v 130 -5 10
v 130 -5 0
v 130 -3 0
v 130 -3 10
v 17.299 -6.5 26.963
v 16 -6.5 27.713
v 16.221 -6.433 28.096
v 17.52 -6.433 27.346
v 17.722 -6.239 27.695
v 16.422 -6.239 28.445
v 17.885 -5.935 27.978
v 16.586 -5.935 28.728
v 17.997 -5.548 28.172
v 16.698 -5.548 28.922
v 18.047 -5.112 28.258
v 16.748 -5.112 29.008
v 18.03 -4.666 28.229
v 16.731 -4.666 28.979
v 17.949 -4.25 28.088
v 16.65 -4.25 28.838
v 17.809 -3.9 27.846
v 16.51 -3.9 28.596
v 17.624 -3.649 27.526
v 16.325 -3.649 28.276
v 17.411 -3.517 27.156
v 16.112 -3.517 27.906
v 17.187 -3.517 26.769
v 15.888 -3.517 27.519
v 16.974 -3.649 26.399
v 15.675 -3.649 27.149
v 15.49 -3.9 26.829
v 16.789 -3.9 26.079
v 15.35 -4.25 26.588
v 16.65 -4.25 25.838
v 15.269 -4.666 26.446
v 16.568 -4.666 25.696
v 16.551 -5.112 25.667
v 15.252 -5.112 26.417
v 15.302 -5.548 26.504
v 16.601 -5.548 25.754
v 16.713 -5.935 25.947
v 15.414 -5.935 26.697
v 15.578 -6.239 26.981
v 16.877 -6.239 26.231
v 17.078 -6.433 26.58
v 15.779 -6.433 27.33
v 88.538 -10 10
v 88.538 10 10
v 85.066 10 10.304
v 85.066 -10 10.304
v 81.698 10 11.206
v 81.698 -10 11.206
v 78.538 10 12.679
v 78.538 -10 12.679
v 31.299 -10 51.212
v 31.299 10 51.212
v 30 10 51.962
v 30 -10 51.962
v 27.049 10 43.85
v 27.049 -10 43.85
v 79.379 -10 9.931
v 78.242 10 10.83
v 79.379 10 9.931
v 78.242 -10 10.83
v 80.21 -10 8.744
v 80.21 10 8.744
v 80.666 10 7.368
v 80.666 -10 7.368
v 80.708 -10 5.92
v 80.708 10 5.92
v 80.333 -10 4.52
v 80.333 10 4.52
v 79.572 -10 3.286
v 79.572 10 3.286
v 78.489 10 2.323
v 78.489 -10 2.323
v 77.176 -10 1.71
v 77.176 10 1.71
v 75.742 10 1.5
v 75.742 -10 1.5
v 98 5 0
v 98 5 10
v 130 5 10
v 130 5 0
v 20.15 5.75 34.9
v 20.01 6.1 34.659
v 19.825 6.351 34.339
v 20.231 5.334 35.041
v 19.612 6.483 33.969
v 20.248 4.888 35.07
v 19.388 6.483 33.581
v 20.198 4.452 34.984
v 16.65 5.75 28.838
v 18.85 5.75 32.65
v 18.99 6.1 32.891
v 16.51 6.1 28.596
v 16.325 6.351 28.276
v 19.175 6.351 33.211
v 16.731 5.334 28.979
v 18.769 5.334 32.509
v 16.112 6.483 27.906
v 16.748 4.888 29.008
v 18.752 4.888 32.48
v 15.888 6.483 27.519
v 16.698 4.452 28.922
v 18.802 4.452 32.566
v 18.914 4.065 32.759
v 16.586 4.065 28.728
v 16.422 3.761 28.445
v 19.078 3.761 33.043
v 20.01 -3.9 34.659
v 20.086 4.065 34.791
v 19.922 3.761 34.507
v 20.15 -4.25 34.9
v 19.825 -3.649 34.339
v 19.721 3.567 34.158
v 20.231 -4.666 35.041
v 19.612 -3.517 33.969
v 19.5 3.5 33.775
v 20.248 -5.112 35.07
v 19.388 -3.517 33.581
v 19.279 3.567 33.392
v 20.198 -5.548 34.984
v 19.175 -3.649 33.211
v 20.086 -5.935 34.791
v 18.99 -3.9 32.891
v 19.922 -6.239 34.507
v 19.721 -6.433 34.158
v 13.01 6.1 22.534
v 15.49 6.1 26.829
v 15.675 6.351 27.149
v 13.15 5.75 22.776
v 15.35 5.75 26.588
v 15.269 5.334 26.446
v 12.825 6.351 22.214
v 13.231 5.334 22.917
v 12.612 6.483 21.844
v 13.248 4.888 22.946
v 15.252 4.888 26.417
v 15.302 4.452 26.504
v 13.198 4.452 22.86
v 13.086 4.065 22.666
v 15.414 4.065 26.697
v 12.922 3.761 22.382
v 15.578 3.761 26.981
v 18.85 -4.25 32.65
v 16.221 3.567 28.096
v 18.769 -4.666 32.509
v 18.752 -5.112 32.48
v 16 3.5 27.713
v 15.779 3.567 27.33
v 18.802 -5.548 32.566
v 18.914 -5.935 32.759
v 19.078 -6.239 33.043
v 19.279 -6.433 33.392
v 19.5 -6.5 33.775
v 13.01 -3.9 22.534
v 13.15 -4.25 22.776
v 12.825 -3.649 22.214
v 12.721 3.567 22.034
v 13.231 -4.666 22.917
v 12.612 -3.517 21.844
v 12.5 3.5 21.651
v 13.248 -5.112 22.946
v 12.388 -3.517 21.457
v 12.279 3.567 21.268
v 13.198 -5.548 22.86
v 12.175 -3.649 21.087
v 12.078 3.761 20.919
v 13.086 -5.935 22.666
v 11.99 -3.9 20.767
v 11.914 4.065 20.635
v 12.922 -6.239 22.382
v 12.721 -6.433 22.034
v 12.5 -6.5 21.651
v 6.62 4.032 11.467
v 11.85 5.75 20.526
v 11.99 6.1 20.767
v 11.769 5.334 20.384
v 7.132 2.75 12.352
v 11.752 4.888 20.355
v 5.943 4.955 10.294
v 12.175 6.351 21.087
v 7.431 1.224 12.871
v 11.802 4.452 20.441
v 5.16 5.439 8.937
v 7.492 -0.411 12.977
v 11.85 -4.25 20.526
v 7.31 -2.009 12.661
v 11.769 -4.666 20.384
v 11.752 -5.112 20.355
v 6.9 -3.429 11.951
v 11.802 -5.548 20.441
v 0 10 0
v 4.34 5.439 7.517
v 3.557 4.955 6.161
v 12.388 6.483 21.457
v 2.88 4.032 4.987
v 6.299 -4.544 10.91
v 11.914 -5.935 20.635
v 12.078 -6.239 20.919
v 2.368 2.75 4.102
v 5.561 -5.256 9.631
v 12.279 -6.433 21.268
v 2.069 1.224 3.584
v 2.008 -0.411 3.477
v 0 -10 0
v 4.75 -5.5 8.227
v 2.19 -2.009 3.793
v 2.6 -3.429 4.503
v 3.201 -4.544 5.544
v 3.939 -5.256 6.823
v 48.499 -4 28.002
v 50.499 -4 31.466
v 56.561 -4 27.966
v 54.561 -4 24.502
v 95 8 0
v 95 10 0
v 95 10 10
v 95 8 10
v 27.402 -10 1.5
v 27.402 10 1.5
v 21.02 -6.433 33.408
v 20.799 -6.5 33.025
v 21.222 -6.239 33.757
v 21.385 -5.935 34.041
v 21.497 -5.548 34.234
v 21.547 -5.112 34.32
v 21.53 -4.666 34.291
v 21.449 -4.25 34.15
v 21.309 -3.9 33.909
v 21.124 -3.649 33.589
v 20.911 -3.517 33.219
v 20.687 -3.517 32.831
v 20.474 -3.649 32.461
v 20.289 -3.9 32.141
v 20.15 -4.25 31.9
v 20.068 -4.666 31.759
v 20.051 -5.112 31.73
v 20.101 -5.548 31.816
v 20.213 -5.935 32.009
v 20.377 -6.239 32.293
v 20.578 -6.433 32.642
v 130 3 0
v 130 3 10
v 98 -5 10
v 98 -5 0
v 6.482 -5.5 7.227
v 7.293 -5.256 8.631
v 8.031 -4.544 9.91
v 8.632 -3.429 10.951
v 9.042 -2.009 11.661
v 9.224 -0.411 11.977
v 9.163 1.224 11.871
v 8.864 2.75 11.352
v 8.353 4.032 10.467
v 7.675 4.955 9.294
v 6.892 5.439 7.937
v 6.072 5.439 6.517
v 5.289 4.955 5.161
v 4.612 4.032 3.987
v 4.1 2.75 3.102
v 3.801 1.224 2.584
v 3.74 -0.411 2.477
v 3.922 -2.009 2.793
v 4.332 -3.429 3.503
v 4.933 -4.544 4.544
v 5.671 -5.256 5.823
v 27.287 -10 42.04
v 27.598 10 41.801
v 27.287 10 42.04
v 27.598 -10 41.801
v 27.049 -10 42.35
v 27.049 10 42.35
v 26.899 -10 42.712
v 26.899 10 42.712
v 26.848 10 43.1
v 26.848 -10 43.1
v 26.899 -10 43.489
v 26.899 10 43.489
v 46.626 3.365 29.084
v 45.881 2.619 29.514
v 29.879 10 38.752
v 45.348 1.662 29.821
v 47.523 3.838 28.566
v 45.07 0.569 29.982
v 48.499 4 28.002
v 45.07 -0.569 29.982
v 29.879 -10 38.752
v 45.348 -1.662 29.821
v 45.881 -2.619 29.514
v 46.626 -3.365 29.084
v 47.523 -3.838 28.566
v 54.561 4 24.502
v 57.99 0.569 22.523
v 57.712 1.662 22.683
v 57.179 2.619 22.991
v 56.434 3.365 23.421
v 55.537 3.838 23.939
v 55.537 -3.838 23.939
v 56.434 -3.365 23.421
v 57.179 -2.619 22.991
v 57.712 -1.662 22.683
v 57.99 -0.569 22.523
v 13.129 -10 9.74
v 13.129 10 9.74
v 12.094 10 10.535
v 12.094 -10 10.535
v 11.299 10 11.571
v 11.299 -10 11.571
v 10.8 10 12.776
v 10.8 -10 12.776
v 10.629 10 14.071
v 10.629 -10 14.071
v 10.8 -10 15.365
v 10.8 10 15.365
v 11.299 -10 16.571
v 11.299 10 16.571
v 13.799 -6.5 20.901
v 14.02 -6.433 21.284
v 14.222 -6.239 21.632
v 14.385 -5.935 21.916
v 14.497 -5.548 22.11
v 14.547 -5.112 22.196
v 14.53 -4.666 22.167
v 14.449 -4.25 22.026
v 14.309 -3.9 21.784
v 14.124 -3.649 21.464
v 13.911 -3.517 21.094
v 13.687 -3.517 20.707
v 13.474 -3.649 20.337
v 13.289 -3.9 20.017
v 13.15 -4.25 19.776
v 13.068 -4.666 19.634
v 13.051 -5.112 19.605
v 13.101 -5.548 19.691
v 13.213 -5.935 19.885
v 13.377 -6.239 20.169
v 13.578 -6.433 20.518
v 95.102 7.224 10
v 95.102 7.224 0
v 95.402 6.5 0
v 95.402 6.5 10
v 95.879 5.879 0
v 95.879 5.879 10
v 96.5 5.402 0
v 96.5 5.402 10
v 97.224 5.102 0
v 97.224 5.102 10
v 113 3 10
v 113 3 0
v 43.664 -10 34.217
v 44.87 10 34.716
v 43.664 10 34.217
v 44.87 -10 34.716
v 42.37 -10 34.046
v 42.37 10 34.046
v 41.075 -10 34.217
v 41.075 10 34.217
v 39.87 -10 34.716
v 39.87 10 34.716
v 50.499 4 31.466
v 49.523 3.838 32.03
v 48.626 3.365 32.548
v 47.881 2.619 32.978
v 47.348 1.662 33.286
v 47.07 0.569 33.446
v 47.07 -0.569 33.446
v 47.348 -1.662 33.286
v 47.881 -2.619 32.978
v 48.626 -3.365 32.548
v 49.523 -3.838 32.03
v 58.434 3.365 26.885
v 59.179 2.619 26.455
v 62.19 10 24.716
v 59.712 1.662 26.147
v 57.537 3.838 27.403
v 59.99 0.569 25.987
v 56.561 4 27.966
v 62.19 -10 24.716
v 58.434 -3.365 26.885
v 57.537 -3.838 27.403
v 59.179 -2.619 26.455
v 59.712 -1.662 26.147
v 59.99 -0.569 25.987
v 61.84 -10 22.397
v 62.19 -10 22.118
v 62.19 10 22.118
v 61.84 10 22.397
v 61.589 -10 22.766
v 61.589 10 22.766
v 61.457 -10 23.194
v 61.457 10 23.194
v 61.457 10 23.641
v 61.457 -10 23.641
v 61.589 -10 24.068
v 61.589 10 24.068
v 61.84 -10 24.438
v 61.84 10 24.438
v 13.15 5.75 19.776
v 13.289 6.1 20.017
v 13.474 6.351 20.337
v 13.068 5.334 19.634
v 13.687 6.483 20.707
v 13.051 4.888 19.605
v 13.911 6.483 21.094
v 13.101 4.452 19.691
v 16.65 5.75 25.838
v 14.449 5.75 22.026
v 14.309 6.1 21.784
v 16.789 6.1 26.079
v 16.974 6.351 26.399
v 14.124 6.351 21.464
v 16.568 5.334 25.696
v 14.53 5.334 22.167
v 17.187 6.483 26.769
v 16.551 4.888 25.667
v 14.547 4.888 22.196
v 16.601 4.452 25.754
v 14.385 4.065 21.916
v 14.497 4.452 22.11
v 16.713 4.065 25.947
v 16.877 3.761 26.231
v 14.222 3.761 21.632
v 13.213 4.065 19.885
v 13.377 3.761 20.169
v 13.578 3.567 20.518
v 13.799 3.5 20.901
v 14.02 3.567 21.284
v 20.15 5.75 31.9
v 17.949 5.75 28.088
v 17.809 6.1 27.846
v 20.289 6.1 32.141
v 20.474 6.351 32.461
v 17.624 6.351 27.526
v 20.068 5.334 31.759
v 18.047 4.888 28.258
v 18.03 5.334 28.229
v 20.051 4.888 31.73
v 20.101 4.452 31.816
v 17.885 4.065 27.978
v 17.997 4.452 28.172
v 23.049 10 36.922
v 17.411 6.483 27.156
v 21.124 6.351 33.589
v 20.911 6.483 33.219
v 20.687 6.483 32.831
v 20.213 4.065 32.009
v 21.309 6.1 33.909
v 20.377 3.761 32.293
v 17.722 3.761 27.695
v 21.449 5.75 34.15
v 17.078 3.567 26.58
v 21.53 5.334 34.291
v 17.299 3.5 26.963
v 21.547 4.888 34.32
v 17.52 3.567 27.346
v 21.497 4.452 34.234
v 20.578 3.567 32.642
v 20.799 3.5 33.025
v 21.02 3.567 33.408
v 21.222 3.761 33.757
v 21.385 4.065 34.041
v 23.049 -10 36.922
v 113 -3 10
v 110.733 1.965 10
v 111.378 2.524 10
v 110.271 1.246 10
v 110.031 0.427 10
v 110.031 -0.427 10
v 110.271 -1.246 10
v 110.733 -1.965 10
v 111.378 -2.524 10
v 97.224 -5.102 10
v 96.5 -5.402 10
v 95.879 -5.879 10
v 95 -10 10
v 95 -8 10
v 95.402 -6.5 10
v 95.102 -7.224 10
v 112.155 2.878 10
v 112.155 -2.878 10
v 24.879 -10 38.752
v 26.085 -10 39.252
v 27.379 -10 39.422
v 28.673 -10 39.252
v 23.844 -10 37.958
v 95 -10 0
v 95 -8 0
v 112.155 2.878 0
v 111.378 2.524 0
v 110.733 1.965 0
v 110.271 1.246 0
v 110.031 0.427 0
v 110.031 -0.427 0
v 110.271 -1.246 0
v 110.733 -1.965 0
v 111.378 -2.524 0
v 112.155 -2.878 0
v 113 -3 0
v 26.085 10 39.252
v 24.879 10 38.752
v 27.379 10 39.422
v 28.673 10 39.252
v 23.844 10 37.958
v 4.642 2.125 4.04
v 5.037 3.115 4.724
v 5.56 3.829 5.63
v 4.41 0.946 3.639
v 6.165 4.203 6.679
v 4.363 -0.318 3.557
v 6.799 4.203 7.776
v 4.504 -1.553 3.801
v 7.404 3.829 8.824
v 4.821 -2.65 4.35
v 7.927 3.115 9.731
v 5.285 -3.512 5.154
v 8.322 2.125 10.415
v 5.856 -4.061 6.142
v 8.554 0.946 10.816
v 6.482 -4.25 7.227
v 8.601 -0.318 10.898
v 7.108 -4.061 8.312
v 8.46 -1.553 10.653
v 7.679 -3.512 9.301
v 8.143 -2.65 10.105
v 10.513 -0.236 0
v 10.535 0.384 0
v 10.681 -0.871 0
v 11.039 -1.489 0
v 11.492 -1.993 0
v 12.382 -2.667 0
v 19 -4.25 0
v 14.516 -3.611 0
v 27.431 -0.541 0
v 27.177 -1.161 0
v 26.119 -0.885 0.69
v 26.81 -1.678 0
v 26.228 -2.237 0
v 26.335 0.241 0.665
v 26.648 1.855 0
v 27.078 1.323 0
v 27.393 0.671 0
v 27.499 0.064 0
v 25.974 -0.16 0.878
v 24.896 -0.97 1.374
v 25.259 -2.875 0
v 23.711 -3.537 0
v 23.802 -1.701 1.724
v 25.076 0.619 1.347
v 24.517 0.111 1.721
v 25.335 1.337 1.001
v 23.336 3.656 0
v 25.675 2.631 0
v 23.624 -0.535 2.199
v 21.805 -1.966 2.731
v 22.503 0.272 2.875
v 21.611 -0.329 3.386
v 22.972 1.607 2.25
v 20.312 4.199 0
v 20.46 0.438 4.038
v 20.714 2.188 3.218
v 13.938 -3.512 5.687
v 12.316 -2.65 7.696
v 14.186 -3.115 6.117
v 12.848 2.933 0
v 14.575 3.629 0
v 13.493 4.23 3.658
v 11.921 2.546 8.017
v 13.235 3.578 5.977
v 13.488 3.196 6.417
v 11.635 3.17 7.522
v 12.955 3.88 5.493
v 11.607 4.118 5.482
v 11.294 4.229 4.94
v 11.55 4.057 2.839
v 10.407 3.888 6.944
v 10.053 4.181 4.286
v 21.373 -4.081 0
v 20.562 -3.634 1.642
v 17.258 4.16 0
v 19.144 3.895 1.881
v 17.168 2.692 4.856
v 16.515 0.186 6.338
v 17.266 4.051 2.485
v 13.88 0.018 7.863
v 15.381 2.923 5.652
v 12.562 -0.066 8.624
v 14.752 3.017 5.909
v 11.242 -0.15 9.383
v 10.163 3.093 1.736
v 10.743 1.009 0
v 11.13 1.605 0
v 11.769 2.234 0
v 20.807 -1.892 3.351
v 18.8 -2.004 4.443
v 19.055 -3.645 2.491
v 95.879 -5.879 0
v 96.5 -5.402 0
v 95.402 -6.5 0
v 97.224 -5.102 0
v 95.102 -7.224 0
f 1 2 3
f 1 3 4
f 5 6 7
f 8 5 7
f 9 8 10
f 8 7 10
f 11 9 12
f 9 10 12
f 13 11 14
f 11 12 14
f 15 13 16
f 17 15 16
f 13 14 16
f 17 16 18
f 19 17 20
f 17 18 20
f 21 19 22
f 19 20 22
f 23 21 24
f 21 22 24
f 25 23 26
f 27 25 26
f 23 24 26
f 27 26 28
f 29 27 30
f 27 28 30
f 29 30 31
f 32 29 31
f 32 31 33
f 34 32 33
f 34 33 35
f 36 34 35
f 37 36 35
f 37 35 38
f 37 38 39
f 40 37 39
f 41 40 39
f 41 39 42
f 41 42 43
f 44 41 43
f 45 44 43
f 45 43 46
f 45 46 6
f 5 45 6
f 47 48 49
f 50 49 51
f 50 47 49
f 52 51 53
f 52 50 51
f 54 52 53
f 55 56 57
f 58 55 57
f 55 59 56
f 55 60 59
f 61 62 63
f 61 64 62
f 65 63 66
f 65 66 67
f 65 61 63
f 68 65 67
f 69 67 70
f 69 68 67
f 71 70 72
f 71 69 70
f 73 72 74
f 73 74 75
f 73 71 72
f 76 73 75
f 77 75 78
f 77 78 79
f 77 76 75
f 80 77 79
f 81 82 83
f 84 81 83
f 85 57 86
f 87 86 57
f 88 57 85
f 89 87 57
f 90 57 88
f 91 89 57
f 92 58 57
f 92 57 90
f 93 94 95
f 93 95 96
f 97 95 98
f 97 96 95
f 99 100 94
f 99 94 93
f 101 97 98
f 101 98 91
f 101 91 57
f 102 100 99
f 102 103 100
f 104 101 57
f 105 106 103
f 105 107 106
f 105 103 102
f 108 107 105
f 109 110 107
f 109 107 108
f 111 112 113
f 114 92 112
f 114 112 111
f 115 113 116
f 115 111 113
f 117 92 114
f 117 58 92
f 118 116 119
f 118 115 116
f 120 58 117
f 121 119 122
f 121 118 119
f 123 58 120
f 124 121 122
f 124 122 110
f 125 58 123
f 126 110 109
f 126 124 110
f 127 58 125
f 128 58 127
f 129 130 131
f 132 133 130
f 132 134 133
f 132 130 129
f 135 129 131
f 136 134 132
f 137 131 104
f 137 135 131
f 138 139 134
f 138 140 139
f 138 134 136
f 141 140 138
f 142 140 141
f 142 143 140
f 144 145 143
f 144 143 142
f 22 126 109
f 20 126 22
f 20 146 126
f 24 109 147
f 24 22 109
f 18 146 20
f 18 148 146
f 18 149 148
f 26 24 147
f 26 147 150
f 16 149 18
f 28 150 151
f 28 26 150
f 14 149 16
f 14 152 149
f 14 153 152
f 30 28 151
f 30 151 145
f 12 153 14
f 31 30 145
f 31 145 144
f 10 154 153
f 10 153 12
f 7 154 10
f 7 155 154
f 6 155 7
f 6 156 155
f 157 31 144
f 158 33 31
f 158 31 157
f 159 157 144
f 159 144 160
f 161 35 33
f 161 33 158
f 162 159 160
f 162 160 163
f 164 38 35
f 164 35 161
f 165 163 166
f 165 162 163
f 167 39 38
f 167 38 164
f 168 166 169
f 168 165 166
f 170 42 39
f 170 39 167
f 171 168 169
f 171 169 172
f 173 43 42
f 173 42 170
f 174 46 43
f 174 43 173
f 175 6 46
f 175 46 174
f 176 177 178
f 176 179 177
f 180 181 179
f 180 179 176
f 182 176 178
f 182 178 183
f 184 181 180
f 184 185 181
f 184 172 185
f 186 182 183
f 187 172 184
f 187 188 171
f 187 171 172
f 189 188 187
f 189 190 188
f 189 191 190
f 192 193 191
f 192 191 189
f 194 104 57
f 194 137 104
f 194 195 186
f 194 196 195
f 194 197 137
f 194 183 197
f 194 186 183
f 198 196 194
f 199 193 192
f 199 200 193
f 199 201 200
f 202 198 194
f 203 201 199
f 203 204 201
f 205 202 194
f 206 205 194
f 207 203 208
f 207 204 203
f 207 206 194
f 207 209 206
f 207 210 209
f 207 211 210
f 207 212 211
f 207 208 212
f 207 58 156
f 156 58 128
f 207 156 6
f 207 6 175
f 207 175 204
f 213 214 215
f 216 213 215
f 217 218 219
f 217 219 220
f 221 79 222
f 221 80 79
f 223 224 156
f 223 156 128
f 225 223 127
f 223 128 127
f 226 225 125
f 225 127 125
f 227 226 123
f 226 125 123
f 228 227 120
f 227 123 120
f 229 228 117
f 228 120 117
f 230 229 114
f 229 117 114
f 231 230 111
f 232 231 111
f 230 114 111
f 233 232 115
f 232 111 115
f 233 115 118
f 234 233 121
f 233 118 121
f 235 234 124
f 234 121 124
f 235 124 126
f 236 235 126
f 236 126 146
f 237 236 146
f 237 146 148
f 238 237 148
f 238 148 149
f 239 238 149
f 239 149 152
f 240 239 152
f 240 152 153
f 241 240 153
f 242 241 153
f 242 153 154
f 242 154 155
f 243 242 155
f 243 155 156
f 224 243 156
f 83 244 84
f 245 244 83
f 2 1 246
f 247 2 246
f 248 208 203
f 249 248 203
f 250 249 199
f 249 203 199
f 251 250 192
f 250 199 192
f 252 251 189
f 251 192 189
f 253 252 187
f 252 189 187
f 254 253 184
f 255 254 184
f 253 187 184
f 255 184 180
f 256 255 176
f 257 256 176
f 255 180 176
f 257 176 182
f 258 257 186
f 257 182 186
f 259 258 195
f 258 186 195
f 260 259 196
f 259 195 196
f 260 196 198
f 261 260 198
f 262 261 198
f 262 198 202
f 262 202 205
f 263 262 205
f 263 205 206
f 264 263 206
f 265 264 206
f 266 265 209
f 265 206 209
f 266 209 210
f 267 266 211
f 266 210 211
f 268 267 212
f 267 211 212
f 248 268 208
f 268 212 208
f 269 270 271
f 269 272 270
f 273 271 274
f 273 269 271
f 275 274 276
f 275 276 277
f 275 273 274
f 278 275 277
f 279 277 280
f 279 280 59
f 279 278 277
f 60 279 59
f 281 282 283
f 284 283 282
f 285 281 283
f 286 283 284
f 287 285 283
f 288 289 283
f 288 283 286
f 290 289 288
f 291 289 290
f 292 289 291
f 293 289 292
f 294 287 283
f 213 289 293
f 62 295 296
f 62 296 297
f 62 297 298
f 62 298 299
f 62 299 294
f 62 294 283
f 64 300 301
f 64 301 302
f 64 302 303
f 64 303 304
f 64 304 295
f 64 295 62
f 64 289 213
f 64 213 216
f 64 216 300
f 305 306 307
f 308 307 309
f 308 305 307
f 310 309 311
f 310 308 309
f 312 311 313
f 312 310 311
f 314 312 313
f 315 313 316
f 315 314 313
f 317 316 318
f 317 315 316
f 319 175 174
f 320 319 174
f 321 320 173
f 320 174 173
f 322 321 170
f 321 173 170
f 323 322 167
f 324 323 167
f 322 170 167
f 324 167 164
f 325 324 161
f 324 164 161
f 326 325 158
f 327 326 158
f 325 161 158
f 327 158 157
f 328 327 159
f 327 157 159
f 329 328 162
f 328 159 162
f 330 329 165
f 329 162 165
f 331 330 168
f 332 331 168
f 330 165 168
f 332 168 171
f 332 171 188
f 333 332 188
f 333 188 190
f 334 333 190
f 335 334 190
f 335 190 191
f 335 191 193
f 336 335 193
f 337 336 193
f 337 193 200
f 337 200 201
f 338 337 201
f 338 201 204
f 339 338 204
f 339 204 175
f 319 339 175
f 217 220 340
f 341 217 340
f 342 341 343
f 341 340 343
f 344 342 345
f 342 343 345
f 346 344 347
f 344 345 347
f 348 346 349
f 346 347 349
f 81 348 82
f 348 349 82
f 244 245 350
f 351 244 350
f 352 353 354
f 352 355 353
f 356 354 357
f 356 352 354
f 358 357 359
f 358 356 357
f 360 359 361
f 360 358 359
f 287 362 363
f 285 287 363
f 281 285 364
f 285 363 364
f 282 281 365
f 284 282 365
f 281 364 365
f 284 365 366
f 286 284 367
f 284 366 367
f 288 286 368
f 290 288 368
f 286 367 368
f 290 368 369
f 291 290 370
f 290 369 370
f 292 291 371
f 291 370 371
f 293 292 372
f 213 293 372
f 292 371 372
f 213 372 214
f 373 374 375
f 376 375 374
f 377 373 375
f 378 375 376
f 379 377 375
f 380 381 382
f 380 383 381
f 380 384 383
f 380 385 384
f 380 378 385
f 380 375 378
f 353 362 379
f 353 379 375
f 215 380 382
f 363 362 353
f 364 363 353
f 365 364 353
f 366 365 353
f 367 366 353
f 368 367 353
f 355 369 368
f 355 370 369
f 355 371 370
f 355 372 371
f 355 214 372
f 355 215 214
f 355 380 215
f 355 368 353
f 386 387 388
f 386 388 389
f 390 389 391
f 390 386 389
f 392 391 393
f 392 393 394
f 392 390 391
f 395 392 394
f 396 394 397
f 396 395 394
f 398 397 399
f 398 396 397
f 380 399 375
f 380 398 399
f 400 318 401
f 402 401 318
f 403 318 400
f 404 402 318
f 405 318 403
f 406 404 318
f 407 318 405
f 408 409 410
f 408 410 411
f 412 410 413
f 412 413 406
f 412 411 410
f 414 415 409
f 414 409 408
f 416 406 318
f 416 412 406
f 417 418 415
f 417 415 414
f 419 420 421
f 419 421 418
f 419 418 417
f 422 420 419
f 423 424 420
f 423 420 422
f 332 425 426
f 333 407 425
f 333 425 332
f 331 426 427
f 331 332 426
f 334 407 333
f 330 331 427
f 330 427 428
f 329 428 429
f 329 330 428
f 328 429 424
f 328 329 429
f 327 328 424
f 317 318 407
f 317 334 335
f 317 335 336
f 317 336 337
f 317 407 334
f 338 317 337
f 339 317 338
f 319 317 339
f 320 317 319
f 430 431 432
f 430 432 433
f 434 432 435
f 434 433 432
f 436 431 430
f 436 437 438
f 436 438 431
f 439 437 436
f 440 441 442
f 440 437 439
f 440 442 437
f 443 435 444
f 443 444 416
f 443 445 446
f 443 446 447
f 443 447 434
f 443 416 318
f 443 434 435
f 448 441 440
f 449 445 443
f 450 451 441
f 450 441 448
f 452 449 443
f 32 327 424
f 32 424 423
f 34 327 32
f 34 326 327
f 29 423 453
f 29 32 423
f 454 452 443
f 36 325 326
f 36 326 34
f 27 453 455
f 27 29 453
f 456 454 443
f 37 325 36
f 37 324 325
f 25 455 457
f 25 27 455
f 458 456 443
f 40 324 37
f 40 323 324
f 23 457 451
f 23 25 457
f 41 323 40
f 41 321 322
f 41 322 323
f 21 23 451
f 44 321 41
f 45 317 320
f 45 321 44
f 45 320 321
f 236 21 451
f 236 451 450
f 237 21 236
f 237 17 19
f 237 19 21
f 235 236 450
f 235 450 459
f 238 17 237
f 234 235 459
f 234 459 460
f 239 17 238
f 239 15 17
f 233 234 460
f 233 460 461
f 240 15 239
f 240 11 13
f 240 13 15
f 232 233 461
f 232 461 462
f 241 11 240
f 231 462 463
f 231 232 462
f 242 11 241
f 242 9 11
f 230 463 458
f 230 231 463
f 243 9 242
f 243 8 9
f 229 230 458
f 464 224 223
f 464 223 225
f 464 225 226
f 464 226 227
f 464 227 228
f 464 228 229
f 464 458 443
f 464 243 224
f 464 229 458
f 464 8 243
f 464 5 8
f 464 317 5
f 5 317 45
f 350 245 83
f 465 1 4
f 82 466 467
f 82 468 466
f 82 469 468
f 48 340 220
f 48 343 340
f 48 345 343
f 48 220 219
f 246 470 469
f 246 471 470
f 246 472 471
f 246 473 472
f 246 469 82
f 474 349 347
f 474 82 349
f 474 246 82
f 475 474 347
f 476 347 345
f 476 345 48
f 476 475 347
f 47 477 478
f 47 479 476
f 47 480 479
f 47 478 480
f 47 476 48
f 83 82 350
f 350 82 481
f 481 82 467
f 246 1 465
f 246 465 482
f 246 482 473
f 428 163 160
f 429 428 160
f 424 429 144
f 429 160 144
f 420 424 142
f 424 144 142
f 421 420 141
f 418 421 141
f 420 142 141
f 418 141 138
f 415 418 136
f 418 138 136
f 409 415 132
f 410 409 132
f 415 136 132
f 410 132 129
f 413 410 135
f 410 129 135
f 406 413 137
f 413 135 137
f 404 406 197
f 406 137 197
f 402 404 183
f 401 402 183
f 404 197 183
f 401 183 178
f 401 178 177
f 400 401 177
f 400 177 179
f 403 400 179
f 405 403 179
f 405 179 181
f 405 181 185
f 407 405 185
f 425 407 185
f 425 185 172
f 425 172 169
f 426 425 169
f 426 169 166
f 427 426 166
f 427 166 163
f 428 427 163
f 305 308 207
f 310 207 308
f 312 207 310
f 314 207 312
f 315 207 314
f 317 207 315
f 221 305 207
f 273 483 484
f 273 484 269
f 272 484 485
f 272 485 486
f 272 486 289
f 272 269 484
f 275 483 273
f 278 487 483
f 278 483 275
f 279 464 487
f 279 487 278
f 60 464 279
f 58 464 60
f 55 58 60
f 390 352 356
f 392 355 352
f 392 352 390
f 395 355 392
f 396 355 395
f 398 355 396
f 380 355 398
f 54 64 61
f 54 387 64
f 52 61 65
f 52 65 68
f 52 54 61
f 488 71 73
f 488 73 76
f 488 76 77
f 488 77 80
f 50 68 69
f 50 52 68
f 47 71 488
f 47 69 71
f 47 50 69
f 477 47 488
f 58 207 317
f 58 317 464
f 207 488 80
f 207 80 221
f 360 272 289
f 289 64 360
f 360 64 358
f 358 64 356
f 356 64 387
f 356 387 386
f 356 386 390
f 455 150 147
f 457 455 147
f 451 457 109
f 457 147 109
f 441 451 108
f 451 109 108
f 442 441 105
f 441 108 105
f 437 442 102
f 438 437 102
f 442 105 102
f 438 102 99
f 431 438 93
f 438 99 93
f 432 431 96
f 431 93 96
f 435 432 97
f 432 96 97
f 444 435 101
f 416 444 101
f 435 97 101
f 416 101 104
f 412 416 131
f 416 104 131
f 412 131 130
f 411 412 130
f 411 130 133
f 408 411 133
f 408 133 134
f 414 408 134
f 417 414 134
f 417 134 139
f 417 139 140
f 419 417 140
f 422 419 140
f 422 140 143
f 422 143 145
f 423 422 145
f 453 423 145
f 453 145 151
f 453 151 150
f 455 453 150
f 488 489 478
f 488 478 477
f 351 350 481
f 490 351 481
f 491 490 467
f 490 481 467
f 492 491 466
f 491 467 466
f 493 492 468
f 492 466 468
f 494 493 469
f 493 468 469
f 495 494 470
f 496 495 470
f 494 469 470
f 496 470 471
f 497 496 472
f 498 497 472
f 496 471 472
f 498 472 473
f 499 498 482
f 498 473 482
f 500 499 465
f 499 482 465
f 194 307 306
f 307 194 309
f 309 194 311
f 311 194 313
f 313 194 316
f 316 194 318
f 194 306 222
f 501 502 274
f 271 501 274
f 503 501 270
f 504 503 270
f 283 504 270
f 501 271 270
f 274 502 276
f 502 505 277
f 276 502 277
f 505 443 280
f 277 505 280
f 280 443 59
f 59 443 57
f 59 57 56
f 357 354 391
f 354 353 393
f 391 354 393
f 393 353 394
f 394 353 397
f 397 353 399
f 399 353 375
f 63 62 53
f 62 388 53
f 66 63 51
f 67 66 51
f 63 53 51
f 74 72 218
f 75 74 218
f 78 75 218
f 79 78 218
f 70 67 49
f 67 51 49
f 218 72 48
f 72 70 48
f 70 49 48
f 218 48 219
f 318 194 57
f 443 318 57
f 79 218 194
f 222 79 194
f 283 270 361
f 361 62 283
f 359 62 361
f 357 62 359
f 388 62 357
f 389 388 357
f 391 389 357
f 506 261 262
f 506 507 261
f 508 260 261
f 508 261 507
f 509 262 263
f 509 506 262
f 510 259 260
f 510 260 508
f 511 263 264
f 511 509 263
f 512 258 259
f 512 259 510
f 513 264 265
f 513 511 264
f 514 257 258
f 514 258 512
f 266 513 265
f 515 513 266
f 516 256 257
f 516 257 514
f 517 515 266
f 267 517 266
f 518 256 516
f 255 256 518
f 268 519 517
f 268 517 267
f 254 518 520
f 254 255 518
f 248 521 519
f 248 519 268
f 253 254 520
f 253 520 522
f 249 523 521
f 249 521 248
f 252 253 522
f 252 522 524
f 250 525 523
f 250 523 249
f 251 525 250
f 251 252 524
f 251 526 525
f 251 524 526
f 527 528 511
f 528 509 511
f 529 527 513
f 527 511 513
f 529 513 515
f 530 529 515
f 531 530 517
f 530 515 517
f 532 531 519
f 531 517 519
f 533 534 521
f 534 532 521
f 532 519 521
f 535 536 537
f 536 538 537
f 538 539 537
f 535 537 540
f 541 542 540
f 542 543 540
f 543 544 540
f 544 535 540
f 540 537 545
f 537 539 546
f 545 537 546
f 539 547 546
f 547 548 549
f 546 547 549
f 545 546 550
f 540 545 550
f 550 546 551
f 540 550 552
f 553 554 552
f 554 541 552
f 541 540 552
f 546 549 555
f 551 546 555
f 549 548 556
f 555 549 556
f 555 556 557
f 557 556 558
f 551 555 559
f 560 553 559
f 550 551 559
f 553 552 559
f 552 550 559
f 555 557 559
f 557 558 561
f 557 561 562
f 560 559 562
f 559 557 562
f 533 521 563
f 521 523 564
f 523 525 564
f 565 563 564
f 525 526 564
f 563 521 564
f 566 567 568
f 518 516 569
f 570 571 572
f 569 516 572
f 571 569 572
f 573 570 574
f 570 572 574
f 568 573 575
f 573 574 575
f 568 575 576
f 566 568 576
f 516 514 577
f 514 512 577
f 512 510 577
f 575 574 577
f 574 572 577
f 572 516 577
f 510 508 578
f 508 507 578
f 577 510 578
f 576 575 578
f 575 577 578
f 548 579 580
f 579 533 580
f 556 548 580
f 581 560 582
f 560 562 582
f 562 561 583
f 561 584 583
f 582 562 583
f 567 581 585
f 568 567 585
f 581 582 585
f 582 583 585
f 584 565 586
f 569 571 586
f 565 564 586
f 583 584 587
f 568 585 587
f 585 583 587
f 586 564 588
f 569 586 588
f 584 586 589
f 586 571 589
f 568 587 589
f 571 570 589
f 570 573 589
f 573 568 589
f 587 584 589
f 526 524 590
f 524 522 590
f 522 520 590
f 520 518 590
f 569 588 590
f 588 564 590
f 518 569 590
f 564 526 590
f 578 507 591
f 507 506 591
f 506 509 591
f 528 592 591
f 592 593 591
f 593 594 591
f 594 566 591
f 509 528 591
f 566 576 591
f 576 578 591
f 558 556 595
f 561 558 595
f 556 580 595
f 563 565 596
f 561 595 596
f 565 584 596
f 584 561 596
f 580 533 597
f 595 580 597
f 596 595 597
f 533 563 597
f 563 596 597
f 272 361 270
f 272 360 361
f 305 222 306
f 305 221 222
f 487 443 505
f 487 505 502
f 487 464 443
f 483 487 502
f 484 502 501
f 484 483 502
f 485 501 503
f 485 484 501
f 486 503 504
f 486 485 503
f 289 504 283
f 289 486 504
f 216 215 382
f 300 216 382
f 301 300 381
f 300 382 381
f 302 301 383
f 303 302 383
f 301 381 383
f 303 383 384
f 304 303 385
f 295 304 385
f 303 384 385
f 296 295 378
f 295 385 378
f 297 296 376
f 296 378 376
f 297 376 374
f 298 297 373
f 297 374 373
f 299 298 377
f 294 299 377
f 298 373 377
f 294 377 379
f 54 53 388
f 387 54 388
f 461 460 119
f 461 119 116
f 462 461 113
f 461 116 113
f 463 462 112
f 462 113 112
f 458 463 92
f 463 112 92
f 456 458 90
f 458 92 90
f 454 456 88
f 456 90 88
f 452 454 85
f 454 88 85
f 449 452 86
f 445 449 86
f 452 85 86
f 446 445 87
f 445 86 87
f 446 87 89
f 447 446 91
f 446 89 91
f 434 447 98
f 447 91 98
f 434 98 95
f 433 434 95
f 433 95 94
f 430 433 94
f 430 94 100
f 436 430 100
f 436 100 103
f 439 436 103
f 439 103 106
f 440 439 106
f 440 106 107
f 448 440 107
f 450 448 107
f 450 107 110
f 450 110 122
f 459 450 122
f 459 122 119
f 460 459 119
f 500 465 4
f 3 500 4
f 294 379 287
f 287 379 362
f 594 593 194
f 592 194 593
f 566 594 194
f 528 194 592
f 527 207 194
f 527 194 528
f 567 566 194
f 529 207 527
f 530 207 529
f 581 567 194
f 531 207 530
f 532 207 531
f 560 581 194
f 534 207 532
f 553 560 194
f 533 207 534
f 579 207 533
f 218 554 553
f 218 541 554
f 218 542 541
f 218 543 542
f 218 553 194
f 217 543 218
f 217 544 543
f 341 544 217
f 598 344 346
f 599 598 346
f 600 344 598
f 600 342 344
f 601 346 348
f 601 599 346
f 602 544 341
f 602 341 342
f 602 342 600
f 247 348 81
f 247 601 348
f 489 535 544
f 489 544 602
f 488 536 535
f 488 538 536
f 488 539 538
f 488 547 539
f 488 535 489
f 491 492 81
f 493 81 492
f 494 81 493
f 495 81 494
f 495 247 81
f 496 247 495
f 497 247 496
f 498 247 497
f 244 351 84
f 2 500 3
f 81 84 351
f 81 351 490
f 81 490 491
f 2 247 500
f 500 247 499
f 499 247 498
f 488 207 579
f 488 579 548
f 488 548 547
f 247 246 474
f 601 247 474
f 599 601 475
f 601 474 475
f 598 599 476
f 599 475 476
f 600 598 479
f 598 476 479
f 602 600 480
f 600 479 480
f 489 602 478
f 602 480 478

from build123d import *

# Parameters (mm, degrees)
F1_DEPTH  = 10
F4_DEPTH  = 8
F5_R      = 1.5
F6_DEPTH  = 30.83145
F7_R      = 5.5
F7_R_2    = 4.25
F8_DEPTH  = 2
F9_DEPTH  = 112.584302492
F11_DEPTH = 25


with BuildPart() as f1:
    # F0 (on Front) → F1 (new body, symmetric)
    with BuildSketch(Plane.XZ):
        with BuildLine():
            Line((30, 51.9615242271), (0, 0))
            Line((0, 0), (130, 0))
            Line((130, 0), (130, 10))
            Line((130, 10), (88.5384757729, 10))
            ThreePointArc((88.5384757729, 10), (83.3620948709, 10.6814834742), (78.5384757729, 12.6794919243))
            Line((78.5384757729, 12.6794919243), (62.1900542571, 22.1182574873))
            ThreePointArc((62.1900542571, 22.1182574873), (61.4400542571, 23.417295593), (62.1900542571, 24.7163336987))
            Line((62.1900542571, 24.7163336987), (44.8695461814, 34.7163336987))
            ThreePointArc((44.8695461814, 34.7163336987), (42.3695461814, 34.0464607176), (39.8695461814, 34.7163336987))
            Line((39.8695461814, 34.7163336987), (27.5980762114, 41.8012701892))
            ThreePointArc((27.5980762114, 41.8012701892), (26.8991874719, 42.7120797272), (27.0490381057, 43.8503082949))
            Line((27.0490381057, 43.8503082949), (31.2990381057, 51.2115242271))
            Line((31.2990381057, 51.2115242271), (30, 51.9615242271))
        make_face()
        with BuildLine():
            ThreePointArc((13.1291651246, 9.7403810568), (10.7995359932, 12.7764128502), (11.2990381057, 16.5705080757))
            Line((11.2990381057, 16.5705080757), (23.0490381057, 36.9221050646))
            ThreePointArc((23.0490381057, 36.9221050646), (26.0850698991, 39.2517341961), (29.8791651246, 38.7522320835))
            Line((29.8791651246, 38.7522320835), (78.2416697508, 10.8301270189))
            ThreePointArc((78.2416697508, 10.8301270189), (80.5712988822, 5.2059047745), (75.7416697508, 1.5))
            Line((75.7416697508, 1.5), (27.4019237886, 1.5))
            Line((27.4019237886, 1.5), (13.1291651246, 9.7403810568))
        make_face(mode=Mode.SUBTRACT)
    extrude(amount=F1_DEPTH, both=True)

    # F2 (on face) → F4 (cut)
    with BuildSketch(Plane(origin=(26.25, 0, 45.4663336987), x_dir=(0.8660254038, 0, -0.5), z_dir=(0.5, 0, 0.8660254038))):
        with BuildLine():
            ThreePointArc((28, 4), (24, 0), (28, -4))
            Line((28, -4), (35, -4))
            ThreePointArc((35, -4), (39, 0), (35, 4))
            Line((35, 4), (28, 4))
        make_face()
    extrude(amount=-F4_DEPTH, mode=Mode.SUBTRACT)

    # F5 (on offset) → F6 (cut)
    with BuildSketch(Plane(origin=(-21.6506350946, 0, 12.5), x_dir=(0, -1, 0), z_dir=(-0.8660254038, 0, 0.5))):
        with Locations((-5, 39)):
            Circle(F5_R)
        with Locations((5, 39)):
            Circle(F5_R)
        with Locations((-5, 32)):
            Circle(F5_R)
        with Locations((5, 32)):
            Circle(F5_R)
        with Locations((5, 25)):
            Circle(F5_R)
        with Locations((-5, 25)):
            Circle(F5_R)
    extrude(amount=-F6_DEPTH, mode=Mode.SUBTRACT)

    # F7 (on face) → F8 (cut)
    with BuildSketch(Plane(origin=(0, 0, 0), x_dir=(0, -1, 0), z_dir=(-0.8660254038, 0, 0.5))):
        with Locations((0, 9.5)):
            Circle(F7_R)
        with Locations((0, 9.5)):
            Circle(F7_R_2, mode=Mode.SUBTRACT)
    extrude(amount=-F8_DEPTH, mode=Mode.SUBTRACT)

    # F9 (cut, through all): a face of the model
    f9_faces = [f1.faces().sort_by_distance(p)[0] for p in [
        (4.75, 0, 8.227241336),
    ]]
    extrude(f9_faces, amount=-F9_DEPTH, mode=Mode.SUBTRACT)

    # F10 (on face) → F11 (cut)
    with BuildSketch(Plane.XY.offset(10)):
        with BuildLine():
            ThreePointArc((95, 8), (95.8786796564, 5.8786796564), (98, 5))
            Line((98, 5), (130, 5))
            Line((130, 5), (130, 10))
            Line((130, 10), (95, 10))
            Line((95, 10), (95, 8))
        make_face()
        with BuildLine():
            Line((130, -3), (130, 3))
            Line((130, 3), (113, 3))
            ThreePointArc((113, 3), (110, 0), (113, -3))
            Line((113, -3), (130, -3))
        make_face()
        with BuildLine():
            Line((130, -10), (130, -5))
            Line((130, -5), (98, -5))
            ThreePointArc((98, -5), (95.8786796564, -5.8786796564), (95, -8))
            Line((95, -8), (95, -10))
            Line((95, -10), (130, -10))
        make_face()
    extrude(amount=-F11_DEPTH, mode=Mode.SUBTRACT)


solid = f1.part
